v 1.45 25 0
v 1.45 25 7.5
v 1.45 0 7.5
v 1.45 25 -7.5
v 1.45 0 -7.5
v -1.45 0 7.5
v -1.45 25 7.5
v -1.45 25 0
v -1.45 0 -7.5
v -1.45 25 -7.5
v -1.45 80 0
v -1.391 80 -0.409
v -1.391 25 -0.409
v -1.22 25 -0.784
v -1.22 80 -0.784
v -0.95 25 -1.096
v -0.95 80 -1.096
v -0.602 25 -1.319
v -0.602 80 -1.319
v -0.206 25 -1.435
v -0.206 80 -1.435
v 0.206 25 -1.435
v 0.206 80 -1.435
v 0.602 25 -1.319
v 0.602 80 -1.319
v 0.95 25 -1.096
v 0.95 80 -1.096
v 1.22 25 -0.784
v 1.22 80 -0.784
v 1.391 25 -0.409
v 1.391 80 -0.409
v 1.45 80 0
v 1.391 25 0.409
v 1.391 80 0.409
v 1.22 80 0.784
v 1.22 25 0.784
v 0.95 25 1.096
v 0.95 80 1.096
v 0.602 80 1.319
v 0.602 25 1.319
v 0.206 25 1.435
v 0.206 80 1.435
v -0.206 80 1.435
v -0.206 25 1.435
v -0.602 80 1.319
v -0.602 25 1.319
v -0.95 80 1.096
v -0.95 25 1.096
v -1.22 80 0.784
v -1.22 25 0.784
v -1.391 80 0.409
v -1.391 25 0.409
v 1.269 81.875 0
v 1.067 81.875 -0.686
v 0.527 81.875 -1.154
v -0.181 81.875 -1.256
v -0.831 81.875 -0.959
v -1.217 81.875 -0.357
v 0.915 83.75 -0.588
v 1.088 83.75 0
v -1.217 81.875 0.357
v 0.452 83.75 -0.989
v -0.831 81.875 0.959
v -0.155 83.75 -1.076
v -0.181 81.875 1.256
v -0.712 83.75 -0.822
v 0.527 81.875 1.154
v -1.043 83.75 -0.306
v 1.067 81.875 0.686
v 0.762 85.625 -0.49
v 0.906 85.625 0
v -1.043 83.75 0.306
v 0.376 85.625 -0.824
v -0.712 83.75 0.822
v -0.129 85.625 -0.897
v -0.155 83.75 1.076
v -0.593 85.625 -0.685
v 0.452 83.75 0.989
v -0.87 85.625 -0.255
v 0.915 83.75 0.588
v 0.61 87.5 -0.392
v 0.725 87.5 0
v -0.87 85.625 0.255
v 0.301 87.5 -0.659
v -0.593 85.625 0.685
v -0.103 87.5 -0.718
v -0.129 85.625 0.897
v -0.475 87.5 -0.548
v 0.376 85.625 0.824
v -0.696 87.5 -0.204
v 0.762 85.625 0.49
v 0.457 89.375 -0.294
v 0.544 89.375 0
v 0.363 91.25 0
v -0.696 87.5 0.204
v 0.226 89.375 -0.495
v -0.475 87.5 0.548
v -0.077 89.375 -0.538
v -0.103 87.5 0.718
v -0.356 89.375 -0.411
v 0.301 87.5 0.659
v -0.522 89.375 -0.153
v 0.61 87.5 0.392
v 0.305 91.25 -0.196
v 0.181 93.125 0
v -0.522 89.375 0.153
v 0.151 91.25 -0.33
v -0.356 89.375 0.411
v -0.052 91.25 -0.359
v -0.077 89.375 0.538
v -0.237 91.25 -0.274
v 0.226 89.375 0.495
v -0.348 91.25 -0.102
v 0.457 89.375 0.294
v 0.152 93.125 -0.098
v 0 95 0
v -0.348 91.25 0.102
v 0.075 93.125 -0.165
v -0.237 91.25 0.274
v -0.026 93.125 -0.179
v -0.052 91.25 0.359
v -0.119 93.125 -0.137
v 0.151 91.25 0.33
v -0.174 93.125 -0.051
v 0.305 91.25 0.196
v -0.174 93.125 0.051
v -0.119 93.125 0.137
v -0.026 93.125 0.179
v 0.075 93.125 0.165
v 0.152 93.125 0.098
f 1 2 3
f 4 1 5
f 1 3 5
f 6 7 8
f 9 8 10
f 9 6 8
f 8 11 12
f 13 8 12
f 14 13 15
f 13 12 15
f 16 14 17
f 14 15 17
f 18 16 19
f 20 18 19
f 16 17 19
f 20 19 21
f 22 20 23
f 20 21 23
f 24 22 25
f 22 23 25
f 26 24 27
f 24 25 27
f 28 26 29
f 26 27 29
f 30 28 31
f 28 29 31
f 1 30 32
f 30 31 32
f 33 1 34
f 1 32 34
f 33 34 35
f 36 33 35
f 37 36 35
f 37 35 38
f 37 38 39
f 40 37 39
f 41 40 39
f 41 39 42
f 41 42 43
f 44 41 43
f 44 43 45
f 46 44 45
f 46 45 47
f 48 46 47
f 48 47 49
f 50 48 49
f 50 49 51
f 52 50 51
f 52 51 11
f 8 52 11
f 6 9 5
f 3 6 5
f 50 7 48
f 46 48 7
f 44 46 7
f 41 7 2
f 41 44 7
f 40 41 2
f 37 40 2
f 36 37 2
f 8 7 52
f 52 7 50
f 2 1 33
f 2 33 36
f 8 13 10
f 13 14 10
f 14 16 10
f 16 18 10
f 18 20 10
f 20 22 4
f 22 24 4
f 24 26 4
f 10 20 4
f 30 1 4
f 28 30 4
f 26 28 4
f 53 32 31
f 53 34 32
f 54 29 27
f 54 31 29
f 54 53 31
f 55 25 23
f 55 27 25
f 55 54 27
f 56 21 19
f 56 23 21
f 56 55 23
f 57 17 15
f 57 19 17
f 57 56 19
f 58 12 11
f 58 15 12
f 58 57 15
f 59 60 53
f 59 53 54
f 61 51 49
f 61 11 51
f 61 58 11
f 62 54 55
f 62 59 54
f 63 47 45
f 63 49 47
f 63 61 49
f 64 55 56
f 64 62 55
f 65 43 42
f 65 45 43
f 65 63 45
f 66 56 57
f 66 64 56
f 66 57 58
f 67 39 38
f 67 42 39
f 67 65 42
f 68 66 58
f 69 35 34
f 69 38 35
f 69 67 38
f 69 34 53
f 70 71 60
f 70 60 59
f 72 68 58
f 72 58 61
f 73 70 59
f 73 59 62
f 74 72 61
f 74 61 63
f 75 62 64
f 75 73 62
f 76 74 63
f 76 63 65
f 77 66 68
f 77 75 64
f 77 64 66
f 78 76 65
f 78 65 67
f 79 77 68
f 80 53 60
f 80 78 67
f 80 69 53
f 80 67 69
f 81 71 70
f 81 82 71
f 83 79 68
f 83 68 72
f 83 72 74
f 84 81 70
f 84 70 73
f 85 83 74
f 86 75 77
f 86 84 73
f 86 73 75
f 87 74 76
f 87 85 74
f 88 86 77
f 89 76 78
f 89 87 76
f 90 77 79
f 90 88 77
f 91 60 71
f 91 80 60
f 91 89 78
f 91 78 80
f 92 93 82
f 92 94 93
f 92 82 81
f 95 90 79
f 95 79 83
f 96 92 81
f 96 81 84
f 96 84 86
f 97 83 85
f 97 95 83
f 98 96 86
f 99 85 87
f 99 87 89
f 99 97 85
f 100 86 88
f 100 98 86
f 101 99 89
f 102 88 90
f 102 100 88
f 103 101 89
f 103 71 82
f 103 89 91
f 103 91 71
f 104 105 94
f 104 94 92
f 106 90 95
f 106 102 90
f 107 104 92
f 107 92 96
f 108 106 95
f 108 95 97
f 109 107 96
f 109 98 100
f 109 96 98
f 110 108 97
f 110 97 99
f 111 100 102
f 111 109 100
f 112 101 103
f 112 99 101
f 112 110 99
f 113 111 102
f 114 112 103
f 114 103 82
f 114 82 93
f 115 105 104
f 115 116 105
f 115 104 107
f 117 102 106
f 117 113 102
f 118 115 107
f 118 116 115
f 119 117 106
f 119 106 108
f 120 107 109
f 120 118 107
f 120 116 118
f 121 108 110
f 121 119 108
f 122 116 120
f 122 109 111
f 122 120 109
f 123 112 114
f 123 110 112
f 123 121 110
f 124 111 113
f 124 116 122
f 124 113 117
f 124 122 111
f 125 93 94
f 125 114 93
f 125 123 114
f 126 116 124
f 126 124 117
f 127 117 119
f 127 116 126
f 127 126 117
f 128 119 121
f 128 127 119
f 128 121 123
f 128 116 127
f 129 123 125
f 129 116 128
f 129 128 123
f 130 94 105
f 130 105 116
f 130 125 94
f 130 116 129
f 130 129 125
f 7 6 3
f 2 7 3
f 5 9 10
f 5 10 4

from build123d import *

# Parameters (mm, degrees)
SKETCH1_W           = 2.9
SKETCH1_H           = 15
BOSS_EXTRUDE1_DEPTH = 80
SKETCH2_W           = 6
SKETCH2_H           = 55
CUT_EXTRUDE1_DEPTH  = 80
CUT_EXTRUDE4_DEPTH  = 55


# Read off the part's stored shape, not the designer's step: Loft2
with BuildPart() as part:
    # Sketch1 → Boss-Extrude1 (new body)
    with BuildSketch(Plane(origin=(0, 0, 0), x_dir=(1, 0, 0), z_dir=(0, 1, 0))):
        Rectangle(SKETCH1_W, SKETCH1_H)
    extrude(amount=BOSS_EXTRUDE1_DEPTH)

    # Sketch2 → Cut-Extrude1 (cut)
    with BuildSketch(Plane(origin=(1.45, 0, 0), x_dir=(0, 0, -1), z_dir=(1, 0, 0))):
        with Locations((-4.5, 52.5)):
            Rectangle(SKETCH2_W, SKETCH2_H)
        with Locations((4.5, 52.5)):
            Rectangle(SKETCH2_W, SKETCH2_H)
    extrude(amount=-CUT_EXTRUDE1_DEPTH, mode=Mode.SUBTRACT)

    # Sketch3 → Cut-Extrude4 (cut)
    with BuildSketch(Plane(origin=(0, 80, 0), x_dir=(1, 0, 0), z_dir=(0, 1, 0))):
        with BuildLine():
            Line((-1.45, 1.5), (-1.45, 5e-09))
            ThreePointArc((-1.45, 5e-09), (3e-09, 1.45), (1.45, 0))
            Line((1.45, 0), (1.45, 1.5))
            Line((1.45, 1.5), (-1.45, 1.5))
        make_face()
        with BuildLine():
            Line((-1.45, 5e-09), (-1.45, -1.5))
            Line((-1.45, -1.5), (1.45, -1.5))
            Line((1.45, -1.5), (1.45, 0))
            ThreePointArc((1.45, 0), (-3e-09, -1.45), (-1.45, 5e-09))
        make_face()
    extrude(amount=-CUT_EXTRUDE4_DEPTH, mode=Mode.SUBTRACT)

    # Loft2 outline → Loft2 (revolve)
    with BuildSketch(Plane.XY):
        Polygon((1.45, 80), (0, 95), (0, 80), align=None)
    revolve(axis=Axis((0, 0, 0), (0, 1, 0)))


solid = part.part
